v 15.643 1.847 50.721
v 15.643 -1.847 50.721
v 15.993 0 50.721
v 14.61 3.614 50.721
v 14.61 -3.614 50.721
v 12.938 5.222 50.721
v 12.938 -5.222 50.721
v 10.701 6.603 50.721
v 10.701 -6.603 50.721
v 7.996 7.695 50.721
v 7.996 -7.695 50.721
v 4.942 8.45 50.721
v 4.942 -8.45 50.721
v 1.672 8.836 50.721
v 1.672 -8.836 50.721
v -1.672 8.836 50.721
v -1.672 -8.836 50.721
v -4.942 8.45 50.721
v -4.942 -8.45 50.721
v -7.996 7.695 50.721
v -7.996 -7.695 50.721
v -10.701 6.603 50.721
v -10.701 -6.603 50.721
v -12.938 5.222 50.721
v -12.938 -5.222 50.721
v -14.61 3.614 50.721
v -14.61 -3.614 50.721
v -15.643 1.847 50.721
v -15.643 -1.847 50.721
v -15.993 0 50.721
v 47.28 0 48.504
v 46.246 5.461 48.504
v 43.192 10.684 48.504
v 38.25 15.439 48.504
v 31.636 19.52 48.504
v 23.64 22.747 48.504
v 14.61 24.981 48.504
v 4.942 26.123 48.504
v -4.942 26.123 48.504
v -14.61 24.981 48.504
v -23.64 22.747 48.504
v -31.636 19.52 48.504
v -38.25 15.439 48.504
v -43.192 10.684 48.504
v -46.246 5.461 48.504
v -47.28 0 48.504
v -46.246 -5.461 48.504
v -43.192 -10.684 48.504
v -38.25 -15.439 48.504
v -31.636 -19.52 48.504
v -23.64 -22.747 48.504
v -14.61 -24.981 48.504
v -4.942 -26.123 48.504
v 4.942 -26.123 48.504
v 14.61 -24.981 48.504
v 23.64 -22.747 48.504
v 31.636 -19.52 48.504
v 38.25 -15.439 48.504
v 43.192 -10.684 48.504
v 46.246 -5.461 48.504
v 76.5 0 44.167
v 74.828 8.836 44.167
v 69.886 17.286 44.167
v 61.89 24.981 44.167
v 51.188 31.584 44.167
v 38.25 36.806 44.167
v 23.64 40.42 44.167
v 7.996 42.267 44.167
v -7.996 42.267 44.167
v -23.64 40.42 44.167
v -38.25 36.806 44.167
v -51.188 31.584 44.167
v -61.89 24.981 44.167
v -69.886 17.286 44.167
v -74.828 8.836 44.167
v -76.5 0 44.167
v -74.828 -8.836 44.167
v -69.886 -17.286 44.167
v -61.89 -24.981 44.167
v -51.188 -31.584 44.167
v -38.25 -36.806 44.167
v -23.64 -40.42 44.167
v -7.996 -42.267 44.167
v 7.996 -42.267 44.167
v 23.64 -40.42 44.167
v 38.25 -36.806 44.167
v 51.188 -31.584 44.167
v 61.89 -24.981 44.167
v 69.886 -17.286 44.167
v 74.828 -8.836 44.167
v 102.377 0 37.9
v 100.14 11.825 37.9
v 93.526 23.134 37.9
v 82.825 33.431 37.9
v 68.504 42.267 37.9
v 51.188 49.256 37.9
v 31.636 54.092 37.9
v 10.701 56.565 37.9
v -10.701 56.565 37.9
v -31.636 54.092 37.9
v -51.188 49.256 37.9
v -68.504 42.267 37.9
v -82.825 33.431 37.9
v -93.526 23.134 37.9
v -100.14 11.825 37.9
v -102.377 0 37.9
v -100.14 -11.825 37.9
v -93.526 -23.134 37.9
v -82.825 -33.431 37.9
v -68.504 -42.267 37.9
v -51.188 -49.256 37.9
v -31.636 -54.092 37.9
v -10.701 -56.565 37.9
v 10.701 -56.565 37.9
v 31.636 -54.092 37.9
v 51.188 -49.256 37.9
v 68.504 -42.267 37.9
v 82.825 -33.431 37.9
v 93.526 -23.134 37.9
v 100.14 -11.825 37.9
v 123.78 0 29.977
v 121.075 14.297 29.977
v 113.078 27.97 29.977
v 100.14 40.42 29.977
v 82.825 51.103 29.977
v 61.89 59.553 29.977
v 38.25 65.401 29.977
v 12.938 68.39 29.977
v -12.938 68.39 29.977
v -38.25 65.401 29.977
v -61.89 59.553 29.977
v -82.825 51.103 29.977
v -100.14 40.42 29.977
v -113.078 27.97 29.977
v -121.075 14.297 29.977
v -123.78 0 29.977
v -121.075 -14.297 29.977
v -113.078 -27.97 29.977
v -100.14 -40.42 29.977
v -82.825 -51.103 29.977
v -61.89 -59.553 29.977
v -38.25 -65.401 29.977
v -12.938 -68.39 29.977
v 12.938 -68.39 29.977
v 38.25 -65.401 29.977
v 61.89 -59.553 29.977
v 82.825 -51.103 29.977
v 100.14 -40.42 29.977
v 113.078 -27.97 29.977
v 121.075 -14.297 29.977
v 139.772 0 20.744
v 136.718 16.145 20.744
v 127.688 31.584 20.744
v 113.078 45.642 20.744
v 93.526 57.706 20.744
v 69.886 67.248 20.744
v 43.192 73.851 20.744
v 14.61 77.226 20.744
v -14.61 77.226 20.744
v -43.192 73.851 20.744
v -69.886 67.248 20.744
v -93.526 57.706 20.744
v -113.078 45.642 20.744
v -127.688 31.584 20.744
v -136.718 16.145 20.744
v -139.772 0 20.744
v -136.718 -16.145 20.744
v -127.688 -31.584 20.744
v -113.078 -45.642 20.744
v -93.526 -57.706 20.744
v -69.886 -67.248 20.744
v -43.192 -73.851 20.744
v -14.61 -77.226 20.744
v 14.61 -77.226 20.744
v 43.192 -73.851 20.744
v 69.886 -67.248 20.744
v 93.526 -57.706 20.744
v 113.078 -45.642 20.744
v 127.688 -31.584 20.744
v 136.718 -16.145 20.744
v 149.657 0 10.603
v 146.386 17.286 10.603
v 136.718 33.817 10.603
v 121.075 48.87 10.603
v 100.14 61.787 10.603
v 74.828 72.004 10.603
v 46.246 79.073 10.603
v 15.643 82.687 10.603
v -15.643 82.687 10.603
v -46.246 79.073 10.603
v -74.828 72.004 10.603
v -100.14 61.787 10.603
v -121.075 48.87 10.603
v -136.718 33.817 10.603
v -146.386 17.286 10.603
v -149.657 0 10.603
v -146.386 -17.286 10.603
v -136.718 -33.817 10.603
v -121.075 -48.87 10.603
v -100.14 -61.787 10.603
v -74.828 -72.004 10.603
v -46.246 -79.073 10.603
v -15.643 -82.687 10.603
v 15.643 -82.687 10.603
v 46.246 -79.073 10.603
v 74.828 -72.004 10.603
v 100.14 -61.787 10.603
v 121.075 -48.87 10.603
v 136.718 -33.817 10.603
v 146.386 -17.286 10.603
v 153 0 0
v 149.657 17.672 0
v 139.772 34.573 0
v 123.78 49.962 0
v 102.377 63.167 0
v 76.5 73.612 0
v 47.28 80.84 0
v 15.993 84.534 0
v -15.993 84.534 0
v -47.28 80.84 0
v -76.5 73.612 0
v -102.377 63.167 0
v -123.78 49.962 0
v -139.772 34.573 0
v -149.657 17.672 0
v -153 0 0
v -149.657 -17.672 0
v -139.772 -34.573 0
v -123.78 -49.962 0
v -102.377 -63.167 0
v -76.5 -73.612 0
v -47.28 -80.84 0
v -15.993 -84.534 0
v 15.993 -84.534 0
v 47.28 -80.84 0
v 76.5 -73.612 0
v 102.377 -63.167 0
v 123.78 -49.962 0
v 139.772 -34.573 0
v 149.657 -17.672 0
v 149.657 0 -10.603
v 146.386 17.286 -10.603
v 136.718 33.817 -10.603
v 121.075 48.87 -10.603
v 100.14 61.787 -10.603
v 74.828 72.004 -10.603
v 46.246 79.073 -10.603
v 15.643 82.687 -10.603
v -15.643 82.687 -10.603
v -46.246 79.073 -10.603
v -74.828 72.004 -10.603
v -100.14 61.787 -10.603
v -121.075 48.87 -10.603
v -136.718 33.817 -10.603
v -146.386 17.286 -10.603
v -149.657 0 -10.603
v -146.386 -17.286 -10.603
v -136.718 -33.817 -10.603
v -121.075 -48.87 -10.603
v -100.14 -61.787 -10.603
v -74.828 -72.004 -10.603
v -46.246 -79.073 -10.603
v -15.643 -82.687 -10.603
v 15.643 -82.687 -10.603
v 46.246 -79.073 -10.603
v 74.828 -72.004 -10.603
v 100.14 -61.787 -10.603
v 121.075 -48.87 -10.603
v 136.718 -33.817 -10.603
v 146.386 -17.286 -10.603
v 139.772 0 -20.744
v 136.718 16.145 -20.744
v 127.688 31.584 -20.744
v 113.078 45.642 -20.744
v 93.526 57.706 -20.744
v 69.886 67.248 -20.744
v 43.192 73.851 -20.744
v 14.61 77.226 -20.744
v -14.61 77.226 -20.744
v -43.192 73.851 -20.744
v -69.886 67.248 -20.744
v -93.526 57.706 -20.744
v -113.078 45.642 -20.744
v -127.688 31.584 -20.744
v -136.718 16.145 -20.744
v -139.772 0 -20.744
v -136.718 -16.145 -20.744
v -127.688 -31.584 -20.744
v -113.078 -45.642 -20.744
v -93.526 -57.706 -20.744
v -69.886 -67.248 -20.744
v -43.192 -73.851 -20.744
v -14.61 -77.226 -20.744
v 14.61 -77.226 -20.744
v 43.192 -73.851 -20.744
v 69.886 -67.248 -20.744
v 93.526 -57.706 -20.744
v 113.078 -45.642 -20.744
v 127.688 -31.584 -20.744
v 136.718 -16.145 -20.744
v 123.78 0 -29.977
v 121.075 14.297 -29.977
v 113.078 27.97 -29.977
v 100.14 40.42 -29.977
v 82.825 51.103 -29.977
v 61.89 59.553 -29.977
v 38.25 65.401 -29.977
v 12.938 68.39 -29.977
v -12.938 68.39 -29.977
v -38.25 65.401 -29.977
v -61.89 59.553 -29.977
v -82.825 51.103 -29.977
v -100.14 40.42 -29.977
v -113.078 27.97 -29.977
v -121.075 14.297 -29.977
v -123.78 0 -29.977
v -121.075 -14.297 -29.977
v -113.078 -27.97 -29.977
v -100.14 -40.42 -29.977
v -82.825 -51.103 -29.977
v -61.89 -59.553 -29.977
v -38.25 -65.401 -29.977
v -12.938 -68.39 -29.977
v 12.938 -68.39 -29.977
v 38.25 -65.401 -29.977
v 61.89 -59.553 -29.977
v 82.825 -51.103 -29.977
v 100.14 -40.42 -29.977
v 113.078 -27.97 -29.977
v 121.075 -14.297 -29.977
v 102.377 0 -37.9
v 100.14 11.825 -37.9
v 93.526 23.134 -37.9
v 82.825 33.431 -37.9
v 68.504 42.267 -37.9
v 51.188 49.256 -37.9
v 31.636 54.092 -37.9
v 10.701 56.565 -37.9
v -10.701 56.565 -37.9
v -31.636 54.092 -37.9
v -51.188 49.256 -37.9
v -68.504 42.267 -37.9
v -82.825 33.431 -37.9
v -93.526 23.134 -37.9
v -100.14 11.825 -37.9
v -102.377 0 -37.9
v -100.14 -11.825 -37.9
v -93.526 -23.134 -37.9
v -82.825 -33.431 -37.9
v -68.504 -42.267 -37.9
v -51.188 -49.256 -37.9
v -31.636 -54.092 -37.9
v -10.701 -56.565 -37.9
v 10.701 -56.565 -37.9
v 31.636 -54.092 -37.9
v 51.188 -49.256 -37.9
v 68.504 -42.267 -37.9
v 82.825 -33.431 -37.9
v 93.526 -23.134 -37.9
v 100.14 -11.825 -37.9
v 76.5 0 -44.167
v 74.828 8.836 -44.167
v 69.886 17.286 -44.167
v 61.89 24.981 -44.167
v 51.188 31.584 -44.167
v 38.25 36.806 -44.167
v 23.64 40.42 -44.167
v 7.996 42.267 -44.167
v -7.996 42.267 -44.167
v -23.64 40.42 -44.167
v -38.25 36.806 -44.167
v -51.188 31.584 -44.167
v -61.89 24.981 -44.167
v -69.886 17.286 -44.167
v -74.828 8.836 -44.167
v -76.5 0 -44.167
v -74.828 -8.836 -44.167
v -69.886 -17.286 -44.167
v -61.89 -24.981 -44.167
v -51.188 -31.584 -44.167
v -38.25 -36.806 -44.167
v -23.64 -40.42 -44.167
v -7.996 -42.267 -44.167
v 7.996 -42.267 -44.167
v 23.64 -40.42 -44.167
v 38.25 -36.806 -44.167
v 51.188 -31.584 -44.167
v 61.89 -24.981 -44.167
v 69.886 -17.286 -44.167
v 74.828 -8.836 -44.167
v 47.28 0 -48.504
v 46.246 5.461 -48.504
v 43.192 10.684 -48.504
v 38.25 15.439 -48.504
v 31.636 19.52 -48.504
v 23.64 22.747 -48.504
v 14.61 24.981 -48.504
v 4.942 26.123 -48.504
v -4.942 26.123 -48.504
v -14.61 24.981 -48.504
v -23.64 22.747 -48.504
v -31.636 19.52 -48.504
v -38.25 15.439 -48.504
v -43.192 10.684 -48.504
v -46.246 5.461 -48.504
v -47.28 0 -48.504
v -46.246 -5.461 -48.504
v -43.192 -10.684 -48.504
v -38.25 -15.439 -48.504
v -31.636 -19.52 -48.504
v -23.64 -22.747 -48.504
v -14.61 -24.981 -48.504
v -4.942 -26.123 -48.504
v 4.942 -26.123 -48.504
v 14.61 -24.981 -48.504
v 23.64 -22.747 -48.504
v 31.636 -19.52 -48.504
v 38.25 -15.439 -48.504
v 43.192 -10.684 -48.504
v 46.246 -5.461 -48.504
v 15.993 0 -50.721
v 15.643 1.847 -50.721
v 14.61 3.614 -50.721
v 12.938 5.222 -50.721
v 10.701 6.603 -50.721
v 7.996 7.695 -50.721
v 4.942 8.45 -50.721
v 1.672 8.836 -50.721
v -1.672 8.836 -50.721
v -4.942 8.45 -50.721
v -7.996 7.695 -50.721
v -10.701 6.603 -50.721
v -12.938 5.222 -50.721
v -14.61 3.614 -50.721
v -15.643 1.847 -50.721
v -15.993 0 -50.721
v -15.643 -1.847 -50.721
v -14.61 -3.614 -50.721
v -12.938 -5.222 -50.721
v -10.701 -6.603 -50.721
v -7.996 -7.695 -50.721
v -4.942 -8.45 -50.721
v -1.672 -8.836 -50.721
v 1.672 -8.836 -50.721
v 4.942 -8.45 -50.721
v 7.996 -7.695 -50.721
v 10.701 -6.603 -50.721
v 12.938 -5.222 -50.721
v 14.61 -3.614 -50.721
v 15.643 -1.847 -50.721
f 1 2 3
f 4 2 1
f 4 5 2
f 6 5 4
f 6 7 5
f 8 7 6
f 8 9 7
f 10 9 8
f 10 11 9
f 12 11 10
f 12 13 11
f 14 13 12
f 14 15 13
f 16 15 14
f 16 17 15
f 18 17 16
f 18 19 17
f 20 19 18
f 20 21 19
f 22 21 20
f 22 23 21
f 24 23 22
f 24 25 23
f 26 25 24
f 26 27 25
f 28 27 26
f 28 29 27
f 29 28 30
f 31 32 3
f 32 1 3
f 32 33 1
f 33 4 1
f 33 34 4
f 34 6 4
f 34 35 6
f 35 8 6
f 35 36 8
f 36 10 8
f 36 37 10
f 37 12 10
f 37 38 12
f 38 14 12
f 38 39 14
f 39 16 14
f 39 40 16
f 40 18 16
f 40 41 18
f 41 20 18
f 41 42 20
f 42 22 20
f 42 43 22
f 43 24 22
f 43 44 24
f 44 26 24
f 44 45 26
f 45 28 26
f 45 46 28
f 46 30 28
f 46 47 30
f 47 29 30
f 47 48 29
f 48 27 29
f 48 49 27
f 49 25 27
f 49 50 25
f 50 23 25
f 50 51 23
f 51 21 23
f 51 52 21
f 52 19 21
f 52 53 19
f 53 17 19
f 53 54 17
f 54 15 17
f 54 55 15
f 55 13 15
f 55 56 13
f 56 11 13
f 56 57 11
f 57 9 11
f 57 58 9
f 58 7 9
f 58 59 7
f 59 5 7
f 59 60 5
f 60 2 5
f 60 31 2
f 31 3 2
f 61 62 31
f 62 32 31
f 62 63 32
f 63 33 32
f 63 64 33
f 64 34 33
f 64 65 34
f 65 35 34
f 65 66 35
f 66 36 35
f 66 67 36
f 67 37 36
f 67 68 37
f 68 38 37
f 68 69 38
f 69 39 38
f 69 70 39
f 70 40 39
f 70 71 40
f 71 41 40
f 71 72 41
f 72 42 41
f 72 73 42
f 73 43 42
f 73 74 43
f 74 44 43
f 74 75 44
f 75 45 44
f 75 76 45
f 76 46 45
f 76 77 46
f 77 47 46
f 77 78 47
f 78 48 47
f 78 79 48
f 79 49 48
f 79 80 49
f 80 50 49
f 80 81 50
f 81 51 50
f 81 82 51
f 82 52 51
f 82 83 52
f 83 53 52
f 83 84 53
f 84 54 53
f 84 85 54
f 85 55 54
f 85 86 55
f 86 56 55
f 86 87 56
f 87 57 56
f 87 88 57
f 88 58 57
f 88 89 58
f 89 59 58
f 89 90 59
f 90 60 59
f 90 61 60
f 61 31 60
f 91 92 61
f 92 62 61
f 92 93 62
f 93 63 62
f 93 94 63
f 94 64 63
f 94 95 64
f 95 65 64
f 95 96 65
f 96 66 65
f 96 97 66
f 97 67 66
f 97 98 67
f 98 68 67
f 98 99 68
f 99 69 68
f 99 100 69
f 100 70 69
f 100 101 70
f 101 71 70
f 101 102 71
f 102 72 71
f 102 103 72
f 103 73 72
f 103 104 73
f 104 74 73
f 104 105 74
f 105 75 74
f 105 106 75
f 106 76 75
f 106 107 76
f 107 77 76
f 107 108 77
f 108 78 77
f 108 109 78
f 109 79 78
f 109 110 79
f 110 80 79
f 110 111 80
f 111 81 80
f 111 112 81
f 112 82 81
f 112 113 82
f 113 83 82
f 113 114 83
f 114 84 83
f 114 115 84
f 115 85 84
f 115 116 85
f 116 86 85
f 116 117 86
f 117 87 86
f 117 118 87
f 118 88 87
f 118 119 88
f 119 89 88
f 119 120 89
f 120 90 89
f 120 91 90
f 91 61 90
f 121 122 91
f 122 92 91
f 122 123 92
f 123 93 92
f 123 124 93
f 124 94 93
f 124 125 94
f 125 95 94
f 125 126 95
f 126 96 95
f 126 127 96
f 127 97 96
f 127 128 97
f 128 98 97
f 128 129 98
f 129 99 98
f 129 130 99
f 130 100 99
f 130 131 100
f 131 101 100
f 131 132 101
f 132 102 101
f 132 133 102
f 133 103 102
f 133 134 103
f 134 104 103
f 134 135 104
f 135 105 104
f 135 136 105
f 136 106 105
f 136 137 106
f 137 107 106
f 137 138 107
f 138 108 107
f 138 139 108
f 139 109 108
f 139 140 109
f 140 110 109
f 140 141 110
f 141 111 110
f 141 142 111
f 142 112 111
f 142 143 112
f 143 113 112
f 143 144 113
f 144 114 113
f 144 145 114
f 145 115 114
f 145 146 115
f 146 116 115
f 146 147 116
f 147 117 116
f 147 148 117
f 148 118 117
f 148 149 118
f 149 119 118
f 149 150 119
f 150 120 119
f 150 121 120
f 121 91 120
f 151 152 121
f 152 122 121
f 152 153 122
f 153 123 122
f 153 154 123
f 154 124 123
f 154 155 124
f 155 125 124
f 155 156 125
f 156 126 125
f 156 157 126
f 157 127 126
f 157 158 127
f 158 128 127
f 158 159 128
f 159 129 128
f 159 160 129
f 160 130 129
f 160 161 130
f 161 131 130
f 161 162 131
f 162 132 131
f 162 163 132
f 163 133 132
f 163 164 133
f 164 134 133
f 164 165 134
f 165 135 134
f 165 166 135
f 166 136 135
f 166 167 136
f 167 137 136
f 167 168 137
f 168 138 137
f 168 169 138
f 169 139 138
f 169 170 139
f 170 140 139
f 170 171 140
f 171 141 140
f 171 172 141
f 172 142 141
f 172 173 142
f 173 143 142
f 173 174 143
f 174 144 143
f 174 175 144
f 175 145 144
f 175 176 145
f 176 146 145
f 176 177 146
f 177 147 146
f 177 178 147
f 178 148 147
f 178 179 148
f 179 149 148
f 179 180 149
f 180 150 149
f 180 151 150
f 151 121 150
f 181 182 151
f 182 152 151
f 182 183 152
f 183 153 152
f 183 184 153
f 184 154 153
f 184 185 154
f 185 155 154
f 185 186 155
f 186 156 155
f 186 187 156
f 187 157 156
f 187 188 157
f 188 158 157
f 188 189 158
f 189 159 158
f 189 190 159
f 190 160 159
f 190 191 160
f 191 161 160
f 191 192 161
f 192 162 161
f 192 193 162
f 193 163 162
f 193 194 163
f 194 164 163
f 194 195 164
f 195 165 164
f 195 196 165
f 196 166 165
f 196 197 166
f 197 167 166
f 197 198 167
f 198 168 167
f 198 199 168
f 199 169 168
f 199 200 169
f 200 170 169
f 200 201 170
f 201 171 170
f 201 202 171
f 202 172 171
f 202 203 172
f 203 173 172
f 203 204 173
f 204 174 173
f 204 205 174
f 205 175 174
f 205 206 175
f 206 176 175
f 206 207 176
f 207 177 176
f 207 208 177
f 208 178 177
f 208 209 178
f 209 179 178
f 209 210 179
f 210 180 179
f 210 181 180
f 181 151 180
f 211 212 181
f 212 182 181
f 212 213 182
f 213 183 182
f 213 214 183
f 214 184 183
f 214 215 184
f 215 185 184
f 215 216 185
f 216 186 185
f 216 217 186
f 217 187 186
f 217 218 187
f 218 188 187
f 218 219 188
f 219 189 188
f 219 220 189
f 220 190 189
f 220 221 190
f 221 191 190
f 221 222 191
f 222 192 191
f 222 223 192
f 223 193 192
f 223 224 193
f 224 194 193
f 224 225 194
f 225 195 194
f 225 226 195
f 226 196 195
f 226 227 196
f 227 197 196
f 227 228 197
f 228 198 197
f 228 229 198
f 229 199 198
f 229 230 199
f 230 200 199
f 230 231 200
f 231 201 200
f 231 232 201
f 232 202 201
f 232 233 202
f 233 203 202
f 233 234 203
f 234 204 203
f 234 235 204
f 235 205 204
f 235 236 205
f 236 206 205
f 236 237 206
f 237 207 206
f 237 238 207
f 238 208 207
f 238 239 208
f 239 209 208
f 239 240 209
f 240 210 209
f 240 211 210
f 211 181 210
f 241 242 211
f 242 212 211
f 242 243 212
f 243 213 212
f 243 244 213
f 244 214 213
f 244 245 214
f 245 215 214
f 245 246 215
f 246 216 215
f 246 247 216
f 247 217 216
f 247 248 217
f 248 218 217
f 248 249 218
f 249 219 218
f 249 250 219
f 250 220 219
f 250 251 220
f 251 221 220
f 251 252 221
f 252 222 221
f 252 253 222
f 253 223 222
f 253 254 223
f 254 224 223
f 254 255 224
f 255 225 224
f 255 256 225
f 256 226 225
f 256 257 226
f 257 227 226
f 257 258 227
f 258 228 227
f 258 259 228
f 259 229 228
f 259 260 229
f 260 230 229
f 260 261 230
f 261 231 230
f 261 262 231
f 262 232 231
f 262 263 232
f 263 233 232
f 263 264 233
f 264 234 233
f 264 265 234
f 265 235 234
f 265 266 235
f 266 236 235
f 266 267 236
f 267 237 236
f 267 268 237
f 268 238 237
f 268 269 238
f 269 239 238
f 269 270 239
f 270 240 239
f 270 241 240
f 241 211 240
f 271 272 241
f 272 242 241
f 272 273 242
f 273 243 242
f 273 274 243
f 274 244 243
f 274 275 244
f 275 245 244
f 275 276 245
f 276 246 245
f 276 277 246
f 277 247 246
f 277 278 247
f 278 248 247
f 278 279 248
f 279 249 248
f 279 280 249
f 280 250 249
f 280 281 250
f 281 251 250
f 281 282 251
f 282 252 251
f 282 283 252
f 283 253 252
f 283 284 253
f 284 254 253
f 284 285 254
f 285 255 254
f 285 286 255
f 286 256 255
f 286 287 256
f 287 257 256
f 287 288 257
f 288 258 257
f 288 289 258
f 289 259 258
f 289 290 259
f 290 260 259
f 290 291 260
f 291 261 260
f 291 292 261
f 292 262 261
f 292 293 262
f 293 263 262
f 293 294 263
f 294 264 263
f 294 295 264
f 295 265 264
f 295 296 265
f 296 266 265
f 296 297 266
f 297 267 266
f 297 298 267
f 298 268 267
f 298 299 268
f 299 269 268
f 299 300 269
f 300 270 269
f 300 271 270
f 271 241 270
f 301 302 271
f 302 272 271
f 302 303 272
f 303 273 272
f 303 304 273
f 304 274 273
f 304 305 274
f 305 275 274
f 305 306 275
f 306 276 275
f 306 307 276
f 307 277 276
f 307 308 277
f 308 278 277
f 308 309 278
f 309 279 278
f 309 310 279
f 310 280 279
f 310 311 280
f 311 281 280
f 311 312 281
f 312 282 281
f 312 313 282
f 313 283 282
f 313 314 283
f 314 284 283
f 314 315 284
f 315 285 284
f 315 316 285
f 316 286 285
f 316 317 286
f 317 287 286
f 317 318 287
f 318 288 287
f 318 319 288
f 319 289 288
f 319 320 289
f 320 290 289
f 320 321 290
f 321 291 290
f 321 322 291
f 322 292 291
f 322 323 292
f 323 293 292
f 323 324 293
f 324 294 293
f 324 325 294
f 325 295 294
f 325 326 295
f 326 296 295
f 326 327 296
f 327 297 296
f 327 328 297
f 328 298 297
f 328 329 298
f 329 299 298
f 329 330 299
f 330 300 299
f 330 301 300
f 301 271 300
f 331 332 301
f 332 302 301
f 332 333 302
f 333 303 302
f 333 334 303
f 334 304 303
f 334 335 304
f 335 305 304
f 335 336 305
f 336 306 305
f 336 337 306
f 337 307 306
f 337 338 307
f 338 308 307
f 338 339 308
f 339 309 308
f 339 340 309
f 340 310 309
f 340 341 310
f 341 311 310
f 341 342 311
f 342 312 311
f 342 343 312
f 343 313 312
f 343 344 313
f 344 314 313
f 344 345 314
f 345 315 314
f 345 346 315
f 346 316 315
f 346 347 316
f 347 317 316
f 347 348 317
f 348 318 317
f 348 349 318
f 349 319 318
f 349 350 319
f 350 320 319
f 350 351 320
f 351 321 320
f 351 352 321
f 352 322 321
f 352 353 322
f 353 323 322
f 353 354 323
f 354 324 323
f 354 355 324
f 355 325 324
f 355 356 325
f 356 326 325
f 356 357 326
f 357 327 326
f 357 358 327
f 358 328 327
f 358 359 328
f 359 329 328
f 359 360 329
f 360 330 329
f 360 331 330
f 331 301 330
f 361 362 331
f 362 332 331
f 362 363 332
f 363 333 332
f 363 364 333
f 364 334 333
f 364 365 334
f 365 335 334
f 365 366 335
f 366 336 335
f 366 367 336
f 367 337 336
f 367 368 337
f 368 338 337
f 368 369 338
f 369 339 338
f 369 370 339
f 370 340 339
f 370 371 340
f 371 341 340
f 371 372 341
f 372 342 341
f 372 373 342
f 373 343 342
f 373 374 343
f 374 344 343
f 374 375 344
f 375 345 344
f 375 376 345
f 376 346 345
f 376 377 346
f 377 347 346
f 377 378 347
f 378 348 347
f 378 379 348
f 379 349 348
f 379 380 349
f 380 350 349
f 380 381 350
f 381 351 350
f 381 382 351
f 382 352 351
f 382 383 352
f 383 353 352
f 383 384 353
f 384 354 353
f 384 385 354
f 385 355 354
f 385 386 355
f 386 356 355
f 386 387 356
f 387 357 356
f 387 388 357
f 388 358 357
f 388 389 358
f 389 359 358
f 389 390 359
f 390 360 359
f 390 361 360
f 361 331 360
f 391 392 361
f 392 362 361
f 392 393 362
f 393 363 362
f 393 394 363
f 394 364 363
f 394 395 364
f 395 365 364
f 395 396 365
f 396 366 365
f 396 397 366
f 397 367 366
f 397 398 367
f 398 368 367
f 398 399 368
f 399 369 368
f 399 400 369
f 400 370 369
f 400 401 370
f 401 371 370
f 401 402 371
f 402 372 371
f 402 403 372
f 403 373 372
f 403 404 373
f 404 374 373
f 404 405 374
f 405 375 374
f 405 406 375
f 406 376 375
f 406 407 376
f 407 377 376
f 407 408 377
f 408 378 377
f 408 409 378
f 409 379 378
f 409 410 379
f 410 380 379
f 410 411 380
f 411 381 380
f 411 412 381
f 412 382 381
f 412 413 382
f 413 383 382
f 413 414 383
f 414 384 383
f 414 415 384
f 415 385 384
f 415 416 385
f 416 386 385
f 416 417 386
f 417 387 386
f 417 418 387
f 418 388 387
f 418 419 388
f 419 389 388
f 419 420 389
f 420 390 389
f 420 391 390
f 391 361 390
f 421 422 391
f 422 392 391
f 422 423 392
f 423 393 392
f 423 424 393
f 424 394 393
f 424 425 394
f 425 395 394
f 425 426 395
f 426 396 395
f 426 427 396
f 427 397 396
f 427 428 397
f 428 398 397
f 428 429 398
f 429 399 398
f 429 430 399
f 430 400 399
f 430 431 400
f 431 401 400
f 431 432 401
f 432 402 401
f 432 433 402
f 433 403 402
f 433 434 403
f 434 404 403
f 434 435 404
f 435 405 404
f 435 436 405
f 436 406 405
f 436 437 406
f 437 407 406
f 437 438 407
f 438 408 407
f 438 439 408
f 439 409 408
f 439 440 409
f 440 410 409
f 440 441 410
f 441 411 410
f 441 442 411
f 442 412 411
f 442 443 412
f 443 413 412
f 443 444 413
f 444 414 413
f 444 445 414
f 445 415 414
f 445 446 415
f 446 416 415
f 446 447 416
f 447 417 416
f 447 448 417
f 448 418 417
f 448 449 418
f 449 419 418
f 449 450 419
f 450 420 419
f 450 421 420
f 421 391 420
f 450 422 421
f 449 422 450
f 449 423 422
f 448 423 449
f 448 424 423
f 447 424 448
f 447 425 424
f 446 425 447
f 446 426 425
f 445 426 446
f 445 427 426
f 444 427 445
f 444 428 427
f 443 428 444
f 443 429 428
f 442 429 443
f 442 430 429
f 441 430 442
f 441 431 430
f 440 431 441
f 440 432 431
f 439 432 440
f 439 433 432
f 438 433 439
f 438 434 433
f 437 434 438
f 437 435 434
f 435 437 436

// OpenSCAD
// Generated by SolidPython 1.0.1 on 2020-07-29 00:46:48


scale(v = [9, 5, 3]) {
	sphere(r = 17);
}
/***********************************************
*********      SolidPython code:      **********
************************************************
 
# import packages: SolidPython
from solid import *
from solid.utils import *
from itertools import chain, combinations, permutations


class Resize:

    def __init__(self, scad_file):
        self.scad_file = scad_file
        #self.scad_file = import_scad(scad_file)
        # cone/cylinder param:
        self.r1 = 0
        self.r2 = 0
        self.h = 0
        # rectangular prism param:
        self.w = 0
        self.l = 0
        # ellipse param:
        self.r = 0

    # import OpenScad code (file name corresponds to shape)


    # classify shape + parameters
    def assign(self, param1, param2, param3):
        if self.scad_file == 'cone.scad':
            self.r1 = param1
            self.r2 = param2
            self.h = param3
        elif self.scad_file == 'cylinder.scad':
            self.r1 = param1
            self.r2 = param2
            self.h = param3
        elif self.scad_file == 'rectangularPrism.scad':
            self.h = param1
            self.l = param2
            self.w = param3
        else:
            self.r = param1
            self.h = param2

    # resize parameters
    def iterate(self):
        x = range(3, 20, 2)
        i = 1
        if self.scad_file == 'cone.scad':
            tempList = list(permutations(x, 2))
            for temp in tempList:
                param1 = temp[0]
                param2 = temp[1]
                filepath = 'produced_scad_files/' + 'cone' + str(param1) + '_' + str(param2) + '_' + '.scad'
                scad_render_to_file(cylinder(h=param1, r1=param2, r2=0), filepath)

        elif self.scad_file == 'cylinder.scad':
            tempList = list(permutations(x, 3))
            for temp in tempList:
                param1 = temp[0]
                param2 = temp[1]
                filepath = 'produced_scad_files/' + 'cylinder' + str(param1) + '_' + str(param2) + '_' + '.scad'
                scad_render_to_file(cylinder(h=param1, r1=param2, r2=param2), filepath)

        elif self.scad_file == 'rectangularPrism.scad':
            tempList = list(permutations(x, 3))
            for temp in tempList:
                param1 = temp[0]
                param2 = temp[1]
                param3 = temp[2]
                filepath = 'produced_scad_files/' + 'rectangularPrism' + str(param1) + '_' + str(param2) + '_' + str(
                    param3) + '.scad'
                scad_render_to_file(cube(size=(param1, param2, param3)), filepath)

        elif self.scad_file == 'ellipse.scad':
            tempList = list(permutations(x, 4))
            for temp in tempList:
                param1 = temp[0]
                param2 = temp[1]
                param3 = temp[2]
                param4 = temp[3]
                filepath = 'produced_scad_files/' + 'ellipse' + str(param1) + '_' + str(param2) + '_' + str(param3) + '_' + str(param4) + '.scad'
                scad_render_to_file(scale([param1, param2, param3])(sphere(r=param4)), filepath)

    def render_to_scadfile(self):
        scad_render_to_file(scad, 'example.scad') 
 
************************************************/
